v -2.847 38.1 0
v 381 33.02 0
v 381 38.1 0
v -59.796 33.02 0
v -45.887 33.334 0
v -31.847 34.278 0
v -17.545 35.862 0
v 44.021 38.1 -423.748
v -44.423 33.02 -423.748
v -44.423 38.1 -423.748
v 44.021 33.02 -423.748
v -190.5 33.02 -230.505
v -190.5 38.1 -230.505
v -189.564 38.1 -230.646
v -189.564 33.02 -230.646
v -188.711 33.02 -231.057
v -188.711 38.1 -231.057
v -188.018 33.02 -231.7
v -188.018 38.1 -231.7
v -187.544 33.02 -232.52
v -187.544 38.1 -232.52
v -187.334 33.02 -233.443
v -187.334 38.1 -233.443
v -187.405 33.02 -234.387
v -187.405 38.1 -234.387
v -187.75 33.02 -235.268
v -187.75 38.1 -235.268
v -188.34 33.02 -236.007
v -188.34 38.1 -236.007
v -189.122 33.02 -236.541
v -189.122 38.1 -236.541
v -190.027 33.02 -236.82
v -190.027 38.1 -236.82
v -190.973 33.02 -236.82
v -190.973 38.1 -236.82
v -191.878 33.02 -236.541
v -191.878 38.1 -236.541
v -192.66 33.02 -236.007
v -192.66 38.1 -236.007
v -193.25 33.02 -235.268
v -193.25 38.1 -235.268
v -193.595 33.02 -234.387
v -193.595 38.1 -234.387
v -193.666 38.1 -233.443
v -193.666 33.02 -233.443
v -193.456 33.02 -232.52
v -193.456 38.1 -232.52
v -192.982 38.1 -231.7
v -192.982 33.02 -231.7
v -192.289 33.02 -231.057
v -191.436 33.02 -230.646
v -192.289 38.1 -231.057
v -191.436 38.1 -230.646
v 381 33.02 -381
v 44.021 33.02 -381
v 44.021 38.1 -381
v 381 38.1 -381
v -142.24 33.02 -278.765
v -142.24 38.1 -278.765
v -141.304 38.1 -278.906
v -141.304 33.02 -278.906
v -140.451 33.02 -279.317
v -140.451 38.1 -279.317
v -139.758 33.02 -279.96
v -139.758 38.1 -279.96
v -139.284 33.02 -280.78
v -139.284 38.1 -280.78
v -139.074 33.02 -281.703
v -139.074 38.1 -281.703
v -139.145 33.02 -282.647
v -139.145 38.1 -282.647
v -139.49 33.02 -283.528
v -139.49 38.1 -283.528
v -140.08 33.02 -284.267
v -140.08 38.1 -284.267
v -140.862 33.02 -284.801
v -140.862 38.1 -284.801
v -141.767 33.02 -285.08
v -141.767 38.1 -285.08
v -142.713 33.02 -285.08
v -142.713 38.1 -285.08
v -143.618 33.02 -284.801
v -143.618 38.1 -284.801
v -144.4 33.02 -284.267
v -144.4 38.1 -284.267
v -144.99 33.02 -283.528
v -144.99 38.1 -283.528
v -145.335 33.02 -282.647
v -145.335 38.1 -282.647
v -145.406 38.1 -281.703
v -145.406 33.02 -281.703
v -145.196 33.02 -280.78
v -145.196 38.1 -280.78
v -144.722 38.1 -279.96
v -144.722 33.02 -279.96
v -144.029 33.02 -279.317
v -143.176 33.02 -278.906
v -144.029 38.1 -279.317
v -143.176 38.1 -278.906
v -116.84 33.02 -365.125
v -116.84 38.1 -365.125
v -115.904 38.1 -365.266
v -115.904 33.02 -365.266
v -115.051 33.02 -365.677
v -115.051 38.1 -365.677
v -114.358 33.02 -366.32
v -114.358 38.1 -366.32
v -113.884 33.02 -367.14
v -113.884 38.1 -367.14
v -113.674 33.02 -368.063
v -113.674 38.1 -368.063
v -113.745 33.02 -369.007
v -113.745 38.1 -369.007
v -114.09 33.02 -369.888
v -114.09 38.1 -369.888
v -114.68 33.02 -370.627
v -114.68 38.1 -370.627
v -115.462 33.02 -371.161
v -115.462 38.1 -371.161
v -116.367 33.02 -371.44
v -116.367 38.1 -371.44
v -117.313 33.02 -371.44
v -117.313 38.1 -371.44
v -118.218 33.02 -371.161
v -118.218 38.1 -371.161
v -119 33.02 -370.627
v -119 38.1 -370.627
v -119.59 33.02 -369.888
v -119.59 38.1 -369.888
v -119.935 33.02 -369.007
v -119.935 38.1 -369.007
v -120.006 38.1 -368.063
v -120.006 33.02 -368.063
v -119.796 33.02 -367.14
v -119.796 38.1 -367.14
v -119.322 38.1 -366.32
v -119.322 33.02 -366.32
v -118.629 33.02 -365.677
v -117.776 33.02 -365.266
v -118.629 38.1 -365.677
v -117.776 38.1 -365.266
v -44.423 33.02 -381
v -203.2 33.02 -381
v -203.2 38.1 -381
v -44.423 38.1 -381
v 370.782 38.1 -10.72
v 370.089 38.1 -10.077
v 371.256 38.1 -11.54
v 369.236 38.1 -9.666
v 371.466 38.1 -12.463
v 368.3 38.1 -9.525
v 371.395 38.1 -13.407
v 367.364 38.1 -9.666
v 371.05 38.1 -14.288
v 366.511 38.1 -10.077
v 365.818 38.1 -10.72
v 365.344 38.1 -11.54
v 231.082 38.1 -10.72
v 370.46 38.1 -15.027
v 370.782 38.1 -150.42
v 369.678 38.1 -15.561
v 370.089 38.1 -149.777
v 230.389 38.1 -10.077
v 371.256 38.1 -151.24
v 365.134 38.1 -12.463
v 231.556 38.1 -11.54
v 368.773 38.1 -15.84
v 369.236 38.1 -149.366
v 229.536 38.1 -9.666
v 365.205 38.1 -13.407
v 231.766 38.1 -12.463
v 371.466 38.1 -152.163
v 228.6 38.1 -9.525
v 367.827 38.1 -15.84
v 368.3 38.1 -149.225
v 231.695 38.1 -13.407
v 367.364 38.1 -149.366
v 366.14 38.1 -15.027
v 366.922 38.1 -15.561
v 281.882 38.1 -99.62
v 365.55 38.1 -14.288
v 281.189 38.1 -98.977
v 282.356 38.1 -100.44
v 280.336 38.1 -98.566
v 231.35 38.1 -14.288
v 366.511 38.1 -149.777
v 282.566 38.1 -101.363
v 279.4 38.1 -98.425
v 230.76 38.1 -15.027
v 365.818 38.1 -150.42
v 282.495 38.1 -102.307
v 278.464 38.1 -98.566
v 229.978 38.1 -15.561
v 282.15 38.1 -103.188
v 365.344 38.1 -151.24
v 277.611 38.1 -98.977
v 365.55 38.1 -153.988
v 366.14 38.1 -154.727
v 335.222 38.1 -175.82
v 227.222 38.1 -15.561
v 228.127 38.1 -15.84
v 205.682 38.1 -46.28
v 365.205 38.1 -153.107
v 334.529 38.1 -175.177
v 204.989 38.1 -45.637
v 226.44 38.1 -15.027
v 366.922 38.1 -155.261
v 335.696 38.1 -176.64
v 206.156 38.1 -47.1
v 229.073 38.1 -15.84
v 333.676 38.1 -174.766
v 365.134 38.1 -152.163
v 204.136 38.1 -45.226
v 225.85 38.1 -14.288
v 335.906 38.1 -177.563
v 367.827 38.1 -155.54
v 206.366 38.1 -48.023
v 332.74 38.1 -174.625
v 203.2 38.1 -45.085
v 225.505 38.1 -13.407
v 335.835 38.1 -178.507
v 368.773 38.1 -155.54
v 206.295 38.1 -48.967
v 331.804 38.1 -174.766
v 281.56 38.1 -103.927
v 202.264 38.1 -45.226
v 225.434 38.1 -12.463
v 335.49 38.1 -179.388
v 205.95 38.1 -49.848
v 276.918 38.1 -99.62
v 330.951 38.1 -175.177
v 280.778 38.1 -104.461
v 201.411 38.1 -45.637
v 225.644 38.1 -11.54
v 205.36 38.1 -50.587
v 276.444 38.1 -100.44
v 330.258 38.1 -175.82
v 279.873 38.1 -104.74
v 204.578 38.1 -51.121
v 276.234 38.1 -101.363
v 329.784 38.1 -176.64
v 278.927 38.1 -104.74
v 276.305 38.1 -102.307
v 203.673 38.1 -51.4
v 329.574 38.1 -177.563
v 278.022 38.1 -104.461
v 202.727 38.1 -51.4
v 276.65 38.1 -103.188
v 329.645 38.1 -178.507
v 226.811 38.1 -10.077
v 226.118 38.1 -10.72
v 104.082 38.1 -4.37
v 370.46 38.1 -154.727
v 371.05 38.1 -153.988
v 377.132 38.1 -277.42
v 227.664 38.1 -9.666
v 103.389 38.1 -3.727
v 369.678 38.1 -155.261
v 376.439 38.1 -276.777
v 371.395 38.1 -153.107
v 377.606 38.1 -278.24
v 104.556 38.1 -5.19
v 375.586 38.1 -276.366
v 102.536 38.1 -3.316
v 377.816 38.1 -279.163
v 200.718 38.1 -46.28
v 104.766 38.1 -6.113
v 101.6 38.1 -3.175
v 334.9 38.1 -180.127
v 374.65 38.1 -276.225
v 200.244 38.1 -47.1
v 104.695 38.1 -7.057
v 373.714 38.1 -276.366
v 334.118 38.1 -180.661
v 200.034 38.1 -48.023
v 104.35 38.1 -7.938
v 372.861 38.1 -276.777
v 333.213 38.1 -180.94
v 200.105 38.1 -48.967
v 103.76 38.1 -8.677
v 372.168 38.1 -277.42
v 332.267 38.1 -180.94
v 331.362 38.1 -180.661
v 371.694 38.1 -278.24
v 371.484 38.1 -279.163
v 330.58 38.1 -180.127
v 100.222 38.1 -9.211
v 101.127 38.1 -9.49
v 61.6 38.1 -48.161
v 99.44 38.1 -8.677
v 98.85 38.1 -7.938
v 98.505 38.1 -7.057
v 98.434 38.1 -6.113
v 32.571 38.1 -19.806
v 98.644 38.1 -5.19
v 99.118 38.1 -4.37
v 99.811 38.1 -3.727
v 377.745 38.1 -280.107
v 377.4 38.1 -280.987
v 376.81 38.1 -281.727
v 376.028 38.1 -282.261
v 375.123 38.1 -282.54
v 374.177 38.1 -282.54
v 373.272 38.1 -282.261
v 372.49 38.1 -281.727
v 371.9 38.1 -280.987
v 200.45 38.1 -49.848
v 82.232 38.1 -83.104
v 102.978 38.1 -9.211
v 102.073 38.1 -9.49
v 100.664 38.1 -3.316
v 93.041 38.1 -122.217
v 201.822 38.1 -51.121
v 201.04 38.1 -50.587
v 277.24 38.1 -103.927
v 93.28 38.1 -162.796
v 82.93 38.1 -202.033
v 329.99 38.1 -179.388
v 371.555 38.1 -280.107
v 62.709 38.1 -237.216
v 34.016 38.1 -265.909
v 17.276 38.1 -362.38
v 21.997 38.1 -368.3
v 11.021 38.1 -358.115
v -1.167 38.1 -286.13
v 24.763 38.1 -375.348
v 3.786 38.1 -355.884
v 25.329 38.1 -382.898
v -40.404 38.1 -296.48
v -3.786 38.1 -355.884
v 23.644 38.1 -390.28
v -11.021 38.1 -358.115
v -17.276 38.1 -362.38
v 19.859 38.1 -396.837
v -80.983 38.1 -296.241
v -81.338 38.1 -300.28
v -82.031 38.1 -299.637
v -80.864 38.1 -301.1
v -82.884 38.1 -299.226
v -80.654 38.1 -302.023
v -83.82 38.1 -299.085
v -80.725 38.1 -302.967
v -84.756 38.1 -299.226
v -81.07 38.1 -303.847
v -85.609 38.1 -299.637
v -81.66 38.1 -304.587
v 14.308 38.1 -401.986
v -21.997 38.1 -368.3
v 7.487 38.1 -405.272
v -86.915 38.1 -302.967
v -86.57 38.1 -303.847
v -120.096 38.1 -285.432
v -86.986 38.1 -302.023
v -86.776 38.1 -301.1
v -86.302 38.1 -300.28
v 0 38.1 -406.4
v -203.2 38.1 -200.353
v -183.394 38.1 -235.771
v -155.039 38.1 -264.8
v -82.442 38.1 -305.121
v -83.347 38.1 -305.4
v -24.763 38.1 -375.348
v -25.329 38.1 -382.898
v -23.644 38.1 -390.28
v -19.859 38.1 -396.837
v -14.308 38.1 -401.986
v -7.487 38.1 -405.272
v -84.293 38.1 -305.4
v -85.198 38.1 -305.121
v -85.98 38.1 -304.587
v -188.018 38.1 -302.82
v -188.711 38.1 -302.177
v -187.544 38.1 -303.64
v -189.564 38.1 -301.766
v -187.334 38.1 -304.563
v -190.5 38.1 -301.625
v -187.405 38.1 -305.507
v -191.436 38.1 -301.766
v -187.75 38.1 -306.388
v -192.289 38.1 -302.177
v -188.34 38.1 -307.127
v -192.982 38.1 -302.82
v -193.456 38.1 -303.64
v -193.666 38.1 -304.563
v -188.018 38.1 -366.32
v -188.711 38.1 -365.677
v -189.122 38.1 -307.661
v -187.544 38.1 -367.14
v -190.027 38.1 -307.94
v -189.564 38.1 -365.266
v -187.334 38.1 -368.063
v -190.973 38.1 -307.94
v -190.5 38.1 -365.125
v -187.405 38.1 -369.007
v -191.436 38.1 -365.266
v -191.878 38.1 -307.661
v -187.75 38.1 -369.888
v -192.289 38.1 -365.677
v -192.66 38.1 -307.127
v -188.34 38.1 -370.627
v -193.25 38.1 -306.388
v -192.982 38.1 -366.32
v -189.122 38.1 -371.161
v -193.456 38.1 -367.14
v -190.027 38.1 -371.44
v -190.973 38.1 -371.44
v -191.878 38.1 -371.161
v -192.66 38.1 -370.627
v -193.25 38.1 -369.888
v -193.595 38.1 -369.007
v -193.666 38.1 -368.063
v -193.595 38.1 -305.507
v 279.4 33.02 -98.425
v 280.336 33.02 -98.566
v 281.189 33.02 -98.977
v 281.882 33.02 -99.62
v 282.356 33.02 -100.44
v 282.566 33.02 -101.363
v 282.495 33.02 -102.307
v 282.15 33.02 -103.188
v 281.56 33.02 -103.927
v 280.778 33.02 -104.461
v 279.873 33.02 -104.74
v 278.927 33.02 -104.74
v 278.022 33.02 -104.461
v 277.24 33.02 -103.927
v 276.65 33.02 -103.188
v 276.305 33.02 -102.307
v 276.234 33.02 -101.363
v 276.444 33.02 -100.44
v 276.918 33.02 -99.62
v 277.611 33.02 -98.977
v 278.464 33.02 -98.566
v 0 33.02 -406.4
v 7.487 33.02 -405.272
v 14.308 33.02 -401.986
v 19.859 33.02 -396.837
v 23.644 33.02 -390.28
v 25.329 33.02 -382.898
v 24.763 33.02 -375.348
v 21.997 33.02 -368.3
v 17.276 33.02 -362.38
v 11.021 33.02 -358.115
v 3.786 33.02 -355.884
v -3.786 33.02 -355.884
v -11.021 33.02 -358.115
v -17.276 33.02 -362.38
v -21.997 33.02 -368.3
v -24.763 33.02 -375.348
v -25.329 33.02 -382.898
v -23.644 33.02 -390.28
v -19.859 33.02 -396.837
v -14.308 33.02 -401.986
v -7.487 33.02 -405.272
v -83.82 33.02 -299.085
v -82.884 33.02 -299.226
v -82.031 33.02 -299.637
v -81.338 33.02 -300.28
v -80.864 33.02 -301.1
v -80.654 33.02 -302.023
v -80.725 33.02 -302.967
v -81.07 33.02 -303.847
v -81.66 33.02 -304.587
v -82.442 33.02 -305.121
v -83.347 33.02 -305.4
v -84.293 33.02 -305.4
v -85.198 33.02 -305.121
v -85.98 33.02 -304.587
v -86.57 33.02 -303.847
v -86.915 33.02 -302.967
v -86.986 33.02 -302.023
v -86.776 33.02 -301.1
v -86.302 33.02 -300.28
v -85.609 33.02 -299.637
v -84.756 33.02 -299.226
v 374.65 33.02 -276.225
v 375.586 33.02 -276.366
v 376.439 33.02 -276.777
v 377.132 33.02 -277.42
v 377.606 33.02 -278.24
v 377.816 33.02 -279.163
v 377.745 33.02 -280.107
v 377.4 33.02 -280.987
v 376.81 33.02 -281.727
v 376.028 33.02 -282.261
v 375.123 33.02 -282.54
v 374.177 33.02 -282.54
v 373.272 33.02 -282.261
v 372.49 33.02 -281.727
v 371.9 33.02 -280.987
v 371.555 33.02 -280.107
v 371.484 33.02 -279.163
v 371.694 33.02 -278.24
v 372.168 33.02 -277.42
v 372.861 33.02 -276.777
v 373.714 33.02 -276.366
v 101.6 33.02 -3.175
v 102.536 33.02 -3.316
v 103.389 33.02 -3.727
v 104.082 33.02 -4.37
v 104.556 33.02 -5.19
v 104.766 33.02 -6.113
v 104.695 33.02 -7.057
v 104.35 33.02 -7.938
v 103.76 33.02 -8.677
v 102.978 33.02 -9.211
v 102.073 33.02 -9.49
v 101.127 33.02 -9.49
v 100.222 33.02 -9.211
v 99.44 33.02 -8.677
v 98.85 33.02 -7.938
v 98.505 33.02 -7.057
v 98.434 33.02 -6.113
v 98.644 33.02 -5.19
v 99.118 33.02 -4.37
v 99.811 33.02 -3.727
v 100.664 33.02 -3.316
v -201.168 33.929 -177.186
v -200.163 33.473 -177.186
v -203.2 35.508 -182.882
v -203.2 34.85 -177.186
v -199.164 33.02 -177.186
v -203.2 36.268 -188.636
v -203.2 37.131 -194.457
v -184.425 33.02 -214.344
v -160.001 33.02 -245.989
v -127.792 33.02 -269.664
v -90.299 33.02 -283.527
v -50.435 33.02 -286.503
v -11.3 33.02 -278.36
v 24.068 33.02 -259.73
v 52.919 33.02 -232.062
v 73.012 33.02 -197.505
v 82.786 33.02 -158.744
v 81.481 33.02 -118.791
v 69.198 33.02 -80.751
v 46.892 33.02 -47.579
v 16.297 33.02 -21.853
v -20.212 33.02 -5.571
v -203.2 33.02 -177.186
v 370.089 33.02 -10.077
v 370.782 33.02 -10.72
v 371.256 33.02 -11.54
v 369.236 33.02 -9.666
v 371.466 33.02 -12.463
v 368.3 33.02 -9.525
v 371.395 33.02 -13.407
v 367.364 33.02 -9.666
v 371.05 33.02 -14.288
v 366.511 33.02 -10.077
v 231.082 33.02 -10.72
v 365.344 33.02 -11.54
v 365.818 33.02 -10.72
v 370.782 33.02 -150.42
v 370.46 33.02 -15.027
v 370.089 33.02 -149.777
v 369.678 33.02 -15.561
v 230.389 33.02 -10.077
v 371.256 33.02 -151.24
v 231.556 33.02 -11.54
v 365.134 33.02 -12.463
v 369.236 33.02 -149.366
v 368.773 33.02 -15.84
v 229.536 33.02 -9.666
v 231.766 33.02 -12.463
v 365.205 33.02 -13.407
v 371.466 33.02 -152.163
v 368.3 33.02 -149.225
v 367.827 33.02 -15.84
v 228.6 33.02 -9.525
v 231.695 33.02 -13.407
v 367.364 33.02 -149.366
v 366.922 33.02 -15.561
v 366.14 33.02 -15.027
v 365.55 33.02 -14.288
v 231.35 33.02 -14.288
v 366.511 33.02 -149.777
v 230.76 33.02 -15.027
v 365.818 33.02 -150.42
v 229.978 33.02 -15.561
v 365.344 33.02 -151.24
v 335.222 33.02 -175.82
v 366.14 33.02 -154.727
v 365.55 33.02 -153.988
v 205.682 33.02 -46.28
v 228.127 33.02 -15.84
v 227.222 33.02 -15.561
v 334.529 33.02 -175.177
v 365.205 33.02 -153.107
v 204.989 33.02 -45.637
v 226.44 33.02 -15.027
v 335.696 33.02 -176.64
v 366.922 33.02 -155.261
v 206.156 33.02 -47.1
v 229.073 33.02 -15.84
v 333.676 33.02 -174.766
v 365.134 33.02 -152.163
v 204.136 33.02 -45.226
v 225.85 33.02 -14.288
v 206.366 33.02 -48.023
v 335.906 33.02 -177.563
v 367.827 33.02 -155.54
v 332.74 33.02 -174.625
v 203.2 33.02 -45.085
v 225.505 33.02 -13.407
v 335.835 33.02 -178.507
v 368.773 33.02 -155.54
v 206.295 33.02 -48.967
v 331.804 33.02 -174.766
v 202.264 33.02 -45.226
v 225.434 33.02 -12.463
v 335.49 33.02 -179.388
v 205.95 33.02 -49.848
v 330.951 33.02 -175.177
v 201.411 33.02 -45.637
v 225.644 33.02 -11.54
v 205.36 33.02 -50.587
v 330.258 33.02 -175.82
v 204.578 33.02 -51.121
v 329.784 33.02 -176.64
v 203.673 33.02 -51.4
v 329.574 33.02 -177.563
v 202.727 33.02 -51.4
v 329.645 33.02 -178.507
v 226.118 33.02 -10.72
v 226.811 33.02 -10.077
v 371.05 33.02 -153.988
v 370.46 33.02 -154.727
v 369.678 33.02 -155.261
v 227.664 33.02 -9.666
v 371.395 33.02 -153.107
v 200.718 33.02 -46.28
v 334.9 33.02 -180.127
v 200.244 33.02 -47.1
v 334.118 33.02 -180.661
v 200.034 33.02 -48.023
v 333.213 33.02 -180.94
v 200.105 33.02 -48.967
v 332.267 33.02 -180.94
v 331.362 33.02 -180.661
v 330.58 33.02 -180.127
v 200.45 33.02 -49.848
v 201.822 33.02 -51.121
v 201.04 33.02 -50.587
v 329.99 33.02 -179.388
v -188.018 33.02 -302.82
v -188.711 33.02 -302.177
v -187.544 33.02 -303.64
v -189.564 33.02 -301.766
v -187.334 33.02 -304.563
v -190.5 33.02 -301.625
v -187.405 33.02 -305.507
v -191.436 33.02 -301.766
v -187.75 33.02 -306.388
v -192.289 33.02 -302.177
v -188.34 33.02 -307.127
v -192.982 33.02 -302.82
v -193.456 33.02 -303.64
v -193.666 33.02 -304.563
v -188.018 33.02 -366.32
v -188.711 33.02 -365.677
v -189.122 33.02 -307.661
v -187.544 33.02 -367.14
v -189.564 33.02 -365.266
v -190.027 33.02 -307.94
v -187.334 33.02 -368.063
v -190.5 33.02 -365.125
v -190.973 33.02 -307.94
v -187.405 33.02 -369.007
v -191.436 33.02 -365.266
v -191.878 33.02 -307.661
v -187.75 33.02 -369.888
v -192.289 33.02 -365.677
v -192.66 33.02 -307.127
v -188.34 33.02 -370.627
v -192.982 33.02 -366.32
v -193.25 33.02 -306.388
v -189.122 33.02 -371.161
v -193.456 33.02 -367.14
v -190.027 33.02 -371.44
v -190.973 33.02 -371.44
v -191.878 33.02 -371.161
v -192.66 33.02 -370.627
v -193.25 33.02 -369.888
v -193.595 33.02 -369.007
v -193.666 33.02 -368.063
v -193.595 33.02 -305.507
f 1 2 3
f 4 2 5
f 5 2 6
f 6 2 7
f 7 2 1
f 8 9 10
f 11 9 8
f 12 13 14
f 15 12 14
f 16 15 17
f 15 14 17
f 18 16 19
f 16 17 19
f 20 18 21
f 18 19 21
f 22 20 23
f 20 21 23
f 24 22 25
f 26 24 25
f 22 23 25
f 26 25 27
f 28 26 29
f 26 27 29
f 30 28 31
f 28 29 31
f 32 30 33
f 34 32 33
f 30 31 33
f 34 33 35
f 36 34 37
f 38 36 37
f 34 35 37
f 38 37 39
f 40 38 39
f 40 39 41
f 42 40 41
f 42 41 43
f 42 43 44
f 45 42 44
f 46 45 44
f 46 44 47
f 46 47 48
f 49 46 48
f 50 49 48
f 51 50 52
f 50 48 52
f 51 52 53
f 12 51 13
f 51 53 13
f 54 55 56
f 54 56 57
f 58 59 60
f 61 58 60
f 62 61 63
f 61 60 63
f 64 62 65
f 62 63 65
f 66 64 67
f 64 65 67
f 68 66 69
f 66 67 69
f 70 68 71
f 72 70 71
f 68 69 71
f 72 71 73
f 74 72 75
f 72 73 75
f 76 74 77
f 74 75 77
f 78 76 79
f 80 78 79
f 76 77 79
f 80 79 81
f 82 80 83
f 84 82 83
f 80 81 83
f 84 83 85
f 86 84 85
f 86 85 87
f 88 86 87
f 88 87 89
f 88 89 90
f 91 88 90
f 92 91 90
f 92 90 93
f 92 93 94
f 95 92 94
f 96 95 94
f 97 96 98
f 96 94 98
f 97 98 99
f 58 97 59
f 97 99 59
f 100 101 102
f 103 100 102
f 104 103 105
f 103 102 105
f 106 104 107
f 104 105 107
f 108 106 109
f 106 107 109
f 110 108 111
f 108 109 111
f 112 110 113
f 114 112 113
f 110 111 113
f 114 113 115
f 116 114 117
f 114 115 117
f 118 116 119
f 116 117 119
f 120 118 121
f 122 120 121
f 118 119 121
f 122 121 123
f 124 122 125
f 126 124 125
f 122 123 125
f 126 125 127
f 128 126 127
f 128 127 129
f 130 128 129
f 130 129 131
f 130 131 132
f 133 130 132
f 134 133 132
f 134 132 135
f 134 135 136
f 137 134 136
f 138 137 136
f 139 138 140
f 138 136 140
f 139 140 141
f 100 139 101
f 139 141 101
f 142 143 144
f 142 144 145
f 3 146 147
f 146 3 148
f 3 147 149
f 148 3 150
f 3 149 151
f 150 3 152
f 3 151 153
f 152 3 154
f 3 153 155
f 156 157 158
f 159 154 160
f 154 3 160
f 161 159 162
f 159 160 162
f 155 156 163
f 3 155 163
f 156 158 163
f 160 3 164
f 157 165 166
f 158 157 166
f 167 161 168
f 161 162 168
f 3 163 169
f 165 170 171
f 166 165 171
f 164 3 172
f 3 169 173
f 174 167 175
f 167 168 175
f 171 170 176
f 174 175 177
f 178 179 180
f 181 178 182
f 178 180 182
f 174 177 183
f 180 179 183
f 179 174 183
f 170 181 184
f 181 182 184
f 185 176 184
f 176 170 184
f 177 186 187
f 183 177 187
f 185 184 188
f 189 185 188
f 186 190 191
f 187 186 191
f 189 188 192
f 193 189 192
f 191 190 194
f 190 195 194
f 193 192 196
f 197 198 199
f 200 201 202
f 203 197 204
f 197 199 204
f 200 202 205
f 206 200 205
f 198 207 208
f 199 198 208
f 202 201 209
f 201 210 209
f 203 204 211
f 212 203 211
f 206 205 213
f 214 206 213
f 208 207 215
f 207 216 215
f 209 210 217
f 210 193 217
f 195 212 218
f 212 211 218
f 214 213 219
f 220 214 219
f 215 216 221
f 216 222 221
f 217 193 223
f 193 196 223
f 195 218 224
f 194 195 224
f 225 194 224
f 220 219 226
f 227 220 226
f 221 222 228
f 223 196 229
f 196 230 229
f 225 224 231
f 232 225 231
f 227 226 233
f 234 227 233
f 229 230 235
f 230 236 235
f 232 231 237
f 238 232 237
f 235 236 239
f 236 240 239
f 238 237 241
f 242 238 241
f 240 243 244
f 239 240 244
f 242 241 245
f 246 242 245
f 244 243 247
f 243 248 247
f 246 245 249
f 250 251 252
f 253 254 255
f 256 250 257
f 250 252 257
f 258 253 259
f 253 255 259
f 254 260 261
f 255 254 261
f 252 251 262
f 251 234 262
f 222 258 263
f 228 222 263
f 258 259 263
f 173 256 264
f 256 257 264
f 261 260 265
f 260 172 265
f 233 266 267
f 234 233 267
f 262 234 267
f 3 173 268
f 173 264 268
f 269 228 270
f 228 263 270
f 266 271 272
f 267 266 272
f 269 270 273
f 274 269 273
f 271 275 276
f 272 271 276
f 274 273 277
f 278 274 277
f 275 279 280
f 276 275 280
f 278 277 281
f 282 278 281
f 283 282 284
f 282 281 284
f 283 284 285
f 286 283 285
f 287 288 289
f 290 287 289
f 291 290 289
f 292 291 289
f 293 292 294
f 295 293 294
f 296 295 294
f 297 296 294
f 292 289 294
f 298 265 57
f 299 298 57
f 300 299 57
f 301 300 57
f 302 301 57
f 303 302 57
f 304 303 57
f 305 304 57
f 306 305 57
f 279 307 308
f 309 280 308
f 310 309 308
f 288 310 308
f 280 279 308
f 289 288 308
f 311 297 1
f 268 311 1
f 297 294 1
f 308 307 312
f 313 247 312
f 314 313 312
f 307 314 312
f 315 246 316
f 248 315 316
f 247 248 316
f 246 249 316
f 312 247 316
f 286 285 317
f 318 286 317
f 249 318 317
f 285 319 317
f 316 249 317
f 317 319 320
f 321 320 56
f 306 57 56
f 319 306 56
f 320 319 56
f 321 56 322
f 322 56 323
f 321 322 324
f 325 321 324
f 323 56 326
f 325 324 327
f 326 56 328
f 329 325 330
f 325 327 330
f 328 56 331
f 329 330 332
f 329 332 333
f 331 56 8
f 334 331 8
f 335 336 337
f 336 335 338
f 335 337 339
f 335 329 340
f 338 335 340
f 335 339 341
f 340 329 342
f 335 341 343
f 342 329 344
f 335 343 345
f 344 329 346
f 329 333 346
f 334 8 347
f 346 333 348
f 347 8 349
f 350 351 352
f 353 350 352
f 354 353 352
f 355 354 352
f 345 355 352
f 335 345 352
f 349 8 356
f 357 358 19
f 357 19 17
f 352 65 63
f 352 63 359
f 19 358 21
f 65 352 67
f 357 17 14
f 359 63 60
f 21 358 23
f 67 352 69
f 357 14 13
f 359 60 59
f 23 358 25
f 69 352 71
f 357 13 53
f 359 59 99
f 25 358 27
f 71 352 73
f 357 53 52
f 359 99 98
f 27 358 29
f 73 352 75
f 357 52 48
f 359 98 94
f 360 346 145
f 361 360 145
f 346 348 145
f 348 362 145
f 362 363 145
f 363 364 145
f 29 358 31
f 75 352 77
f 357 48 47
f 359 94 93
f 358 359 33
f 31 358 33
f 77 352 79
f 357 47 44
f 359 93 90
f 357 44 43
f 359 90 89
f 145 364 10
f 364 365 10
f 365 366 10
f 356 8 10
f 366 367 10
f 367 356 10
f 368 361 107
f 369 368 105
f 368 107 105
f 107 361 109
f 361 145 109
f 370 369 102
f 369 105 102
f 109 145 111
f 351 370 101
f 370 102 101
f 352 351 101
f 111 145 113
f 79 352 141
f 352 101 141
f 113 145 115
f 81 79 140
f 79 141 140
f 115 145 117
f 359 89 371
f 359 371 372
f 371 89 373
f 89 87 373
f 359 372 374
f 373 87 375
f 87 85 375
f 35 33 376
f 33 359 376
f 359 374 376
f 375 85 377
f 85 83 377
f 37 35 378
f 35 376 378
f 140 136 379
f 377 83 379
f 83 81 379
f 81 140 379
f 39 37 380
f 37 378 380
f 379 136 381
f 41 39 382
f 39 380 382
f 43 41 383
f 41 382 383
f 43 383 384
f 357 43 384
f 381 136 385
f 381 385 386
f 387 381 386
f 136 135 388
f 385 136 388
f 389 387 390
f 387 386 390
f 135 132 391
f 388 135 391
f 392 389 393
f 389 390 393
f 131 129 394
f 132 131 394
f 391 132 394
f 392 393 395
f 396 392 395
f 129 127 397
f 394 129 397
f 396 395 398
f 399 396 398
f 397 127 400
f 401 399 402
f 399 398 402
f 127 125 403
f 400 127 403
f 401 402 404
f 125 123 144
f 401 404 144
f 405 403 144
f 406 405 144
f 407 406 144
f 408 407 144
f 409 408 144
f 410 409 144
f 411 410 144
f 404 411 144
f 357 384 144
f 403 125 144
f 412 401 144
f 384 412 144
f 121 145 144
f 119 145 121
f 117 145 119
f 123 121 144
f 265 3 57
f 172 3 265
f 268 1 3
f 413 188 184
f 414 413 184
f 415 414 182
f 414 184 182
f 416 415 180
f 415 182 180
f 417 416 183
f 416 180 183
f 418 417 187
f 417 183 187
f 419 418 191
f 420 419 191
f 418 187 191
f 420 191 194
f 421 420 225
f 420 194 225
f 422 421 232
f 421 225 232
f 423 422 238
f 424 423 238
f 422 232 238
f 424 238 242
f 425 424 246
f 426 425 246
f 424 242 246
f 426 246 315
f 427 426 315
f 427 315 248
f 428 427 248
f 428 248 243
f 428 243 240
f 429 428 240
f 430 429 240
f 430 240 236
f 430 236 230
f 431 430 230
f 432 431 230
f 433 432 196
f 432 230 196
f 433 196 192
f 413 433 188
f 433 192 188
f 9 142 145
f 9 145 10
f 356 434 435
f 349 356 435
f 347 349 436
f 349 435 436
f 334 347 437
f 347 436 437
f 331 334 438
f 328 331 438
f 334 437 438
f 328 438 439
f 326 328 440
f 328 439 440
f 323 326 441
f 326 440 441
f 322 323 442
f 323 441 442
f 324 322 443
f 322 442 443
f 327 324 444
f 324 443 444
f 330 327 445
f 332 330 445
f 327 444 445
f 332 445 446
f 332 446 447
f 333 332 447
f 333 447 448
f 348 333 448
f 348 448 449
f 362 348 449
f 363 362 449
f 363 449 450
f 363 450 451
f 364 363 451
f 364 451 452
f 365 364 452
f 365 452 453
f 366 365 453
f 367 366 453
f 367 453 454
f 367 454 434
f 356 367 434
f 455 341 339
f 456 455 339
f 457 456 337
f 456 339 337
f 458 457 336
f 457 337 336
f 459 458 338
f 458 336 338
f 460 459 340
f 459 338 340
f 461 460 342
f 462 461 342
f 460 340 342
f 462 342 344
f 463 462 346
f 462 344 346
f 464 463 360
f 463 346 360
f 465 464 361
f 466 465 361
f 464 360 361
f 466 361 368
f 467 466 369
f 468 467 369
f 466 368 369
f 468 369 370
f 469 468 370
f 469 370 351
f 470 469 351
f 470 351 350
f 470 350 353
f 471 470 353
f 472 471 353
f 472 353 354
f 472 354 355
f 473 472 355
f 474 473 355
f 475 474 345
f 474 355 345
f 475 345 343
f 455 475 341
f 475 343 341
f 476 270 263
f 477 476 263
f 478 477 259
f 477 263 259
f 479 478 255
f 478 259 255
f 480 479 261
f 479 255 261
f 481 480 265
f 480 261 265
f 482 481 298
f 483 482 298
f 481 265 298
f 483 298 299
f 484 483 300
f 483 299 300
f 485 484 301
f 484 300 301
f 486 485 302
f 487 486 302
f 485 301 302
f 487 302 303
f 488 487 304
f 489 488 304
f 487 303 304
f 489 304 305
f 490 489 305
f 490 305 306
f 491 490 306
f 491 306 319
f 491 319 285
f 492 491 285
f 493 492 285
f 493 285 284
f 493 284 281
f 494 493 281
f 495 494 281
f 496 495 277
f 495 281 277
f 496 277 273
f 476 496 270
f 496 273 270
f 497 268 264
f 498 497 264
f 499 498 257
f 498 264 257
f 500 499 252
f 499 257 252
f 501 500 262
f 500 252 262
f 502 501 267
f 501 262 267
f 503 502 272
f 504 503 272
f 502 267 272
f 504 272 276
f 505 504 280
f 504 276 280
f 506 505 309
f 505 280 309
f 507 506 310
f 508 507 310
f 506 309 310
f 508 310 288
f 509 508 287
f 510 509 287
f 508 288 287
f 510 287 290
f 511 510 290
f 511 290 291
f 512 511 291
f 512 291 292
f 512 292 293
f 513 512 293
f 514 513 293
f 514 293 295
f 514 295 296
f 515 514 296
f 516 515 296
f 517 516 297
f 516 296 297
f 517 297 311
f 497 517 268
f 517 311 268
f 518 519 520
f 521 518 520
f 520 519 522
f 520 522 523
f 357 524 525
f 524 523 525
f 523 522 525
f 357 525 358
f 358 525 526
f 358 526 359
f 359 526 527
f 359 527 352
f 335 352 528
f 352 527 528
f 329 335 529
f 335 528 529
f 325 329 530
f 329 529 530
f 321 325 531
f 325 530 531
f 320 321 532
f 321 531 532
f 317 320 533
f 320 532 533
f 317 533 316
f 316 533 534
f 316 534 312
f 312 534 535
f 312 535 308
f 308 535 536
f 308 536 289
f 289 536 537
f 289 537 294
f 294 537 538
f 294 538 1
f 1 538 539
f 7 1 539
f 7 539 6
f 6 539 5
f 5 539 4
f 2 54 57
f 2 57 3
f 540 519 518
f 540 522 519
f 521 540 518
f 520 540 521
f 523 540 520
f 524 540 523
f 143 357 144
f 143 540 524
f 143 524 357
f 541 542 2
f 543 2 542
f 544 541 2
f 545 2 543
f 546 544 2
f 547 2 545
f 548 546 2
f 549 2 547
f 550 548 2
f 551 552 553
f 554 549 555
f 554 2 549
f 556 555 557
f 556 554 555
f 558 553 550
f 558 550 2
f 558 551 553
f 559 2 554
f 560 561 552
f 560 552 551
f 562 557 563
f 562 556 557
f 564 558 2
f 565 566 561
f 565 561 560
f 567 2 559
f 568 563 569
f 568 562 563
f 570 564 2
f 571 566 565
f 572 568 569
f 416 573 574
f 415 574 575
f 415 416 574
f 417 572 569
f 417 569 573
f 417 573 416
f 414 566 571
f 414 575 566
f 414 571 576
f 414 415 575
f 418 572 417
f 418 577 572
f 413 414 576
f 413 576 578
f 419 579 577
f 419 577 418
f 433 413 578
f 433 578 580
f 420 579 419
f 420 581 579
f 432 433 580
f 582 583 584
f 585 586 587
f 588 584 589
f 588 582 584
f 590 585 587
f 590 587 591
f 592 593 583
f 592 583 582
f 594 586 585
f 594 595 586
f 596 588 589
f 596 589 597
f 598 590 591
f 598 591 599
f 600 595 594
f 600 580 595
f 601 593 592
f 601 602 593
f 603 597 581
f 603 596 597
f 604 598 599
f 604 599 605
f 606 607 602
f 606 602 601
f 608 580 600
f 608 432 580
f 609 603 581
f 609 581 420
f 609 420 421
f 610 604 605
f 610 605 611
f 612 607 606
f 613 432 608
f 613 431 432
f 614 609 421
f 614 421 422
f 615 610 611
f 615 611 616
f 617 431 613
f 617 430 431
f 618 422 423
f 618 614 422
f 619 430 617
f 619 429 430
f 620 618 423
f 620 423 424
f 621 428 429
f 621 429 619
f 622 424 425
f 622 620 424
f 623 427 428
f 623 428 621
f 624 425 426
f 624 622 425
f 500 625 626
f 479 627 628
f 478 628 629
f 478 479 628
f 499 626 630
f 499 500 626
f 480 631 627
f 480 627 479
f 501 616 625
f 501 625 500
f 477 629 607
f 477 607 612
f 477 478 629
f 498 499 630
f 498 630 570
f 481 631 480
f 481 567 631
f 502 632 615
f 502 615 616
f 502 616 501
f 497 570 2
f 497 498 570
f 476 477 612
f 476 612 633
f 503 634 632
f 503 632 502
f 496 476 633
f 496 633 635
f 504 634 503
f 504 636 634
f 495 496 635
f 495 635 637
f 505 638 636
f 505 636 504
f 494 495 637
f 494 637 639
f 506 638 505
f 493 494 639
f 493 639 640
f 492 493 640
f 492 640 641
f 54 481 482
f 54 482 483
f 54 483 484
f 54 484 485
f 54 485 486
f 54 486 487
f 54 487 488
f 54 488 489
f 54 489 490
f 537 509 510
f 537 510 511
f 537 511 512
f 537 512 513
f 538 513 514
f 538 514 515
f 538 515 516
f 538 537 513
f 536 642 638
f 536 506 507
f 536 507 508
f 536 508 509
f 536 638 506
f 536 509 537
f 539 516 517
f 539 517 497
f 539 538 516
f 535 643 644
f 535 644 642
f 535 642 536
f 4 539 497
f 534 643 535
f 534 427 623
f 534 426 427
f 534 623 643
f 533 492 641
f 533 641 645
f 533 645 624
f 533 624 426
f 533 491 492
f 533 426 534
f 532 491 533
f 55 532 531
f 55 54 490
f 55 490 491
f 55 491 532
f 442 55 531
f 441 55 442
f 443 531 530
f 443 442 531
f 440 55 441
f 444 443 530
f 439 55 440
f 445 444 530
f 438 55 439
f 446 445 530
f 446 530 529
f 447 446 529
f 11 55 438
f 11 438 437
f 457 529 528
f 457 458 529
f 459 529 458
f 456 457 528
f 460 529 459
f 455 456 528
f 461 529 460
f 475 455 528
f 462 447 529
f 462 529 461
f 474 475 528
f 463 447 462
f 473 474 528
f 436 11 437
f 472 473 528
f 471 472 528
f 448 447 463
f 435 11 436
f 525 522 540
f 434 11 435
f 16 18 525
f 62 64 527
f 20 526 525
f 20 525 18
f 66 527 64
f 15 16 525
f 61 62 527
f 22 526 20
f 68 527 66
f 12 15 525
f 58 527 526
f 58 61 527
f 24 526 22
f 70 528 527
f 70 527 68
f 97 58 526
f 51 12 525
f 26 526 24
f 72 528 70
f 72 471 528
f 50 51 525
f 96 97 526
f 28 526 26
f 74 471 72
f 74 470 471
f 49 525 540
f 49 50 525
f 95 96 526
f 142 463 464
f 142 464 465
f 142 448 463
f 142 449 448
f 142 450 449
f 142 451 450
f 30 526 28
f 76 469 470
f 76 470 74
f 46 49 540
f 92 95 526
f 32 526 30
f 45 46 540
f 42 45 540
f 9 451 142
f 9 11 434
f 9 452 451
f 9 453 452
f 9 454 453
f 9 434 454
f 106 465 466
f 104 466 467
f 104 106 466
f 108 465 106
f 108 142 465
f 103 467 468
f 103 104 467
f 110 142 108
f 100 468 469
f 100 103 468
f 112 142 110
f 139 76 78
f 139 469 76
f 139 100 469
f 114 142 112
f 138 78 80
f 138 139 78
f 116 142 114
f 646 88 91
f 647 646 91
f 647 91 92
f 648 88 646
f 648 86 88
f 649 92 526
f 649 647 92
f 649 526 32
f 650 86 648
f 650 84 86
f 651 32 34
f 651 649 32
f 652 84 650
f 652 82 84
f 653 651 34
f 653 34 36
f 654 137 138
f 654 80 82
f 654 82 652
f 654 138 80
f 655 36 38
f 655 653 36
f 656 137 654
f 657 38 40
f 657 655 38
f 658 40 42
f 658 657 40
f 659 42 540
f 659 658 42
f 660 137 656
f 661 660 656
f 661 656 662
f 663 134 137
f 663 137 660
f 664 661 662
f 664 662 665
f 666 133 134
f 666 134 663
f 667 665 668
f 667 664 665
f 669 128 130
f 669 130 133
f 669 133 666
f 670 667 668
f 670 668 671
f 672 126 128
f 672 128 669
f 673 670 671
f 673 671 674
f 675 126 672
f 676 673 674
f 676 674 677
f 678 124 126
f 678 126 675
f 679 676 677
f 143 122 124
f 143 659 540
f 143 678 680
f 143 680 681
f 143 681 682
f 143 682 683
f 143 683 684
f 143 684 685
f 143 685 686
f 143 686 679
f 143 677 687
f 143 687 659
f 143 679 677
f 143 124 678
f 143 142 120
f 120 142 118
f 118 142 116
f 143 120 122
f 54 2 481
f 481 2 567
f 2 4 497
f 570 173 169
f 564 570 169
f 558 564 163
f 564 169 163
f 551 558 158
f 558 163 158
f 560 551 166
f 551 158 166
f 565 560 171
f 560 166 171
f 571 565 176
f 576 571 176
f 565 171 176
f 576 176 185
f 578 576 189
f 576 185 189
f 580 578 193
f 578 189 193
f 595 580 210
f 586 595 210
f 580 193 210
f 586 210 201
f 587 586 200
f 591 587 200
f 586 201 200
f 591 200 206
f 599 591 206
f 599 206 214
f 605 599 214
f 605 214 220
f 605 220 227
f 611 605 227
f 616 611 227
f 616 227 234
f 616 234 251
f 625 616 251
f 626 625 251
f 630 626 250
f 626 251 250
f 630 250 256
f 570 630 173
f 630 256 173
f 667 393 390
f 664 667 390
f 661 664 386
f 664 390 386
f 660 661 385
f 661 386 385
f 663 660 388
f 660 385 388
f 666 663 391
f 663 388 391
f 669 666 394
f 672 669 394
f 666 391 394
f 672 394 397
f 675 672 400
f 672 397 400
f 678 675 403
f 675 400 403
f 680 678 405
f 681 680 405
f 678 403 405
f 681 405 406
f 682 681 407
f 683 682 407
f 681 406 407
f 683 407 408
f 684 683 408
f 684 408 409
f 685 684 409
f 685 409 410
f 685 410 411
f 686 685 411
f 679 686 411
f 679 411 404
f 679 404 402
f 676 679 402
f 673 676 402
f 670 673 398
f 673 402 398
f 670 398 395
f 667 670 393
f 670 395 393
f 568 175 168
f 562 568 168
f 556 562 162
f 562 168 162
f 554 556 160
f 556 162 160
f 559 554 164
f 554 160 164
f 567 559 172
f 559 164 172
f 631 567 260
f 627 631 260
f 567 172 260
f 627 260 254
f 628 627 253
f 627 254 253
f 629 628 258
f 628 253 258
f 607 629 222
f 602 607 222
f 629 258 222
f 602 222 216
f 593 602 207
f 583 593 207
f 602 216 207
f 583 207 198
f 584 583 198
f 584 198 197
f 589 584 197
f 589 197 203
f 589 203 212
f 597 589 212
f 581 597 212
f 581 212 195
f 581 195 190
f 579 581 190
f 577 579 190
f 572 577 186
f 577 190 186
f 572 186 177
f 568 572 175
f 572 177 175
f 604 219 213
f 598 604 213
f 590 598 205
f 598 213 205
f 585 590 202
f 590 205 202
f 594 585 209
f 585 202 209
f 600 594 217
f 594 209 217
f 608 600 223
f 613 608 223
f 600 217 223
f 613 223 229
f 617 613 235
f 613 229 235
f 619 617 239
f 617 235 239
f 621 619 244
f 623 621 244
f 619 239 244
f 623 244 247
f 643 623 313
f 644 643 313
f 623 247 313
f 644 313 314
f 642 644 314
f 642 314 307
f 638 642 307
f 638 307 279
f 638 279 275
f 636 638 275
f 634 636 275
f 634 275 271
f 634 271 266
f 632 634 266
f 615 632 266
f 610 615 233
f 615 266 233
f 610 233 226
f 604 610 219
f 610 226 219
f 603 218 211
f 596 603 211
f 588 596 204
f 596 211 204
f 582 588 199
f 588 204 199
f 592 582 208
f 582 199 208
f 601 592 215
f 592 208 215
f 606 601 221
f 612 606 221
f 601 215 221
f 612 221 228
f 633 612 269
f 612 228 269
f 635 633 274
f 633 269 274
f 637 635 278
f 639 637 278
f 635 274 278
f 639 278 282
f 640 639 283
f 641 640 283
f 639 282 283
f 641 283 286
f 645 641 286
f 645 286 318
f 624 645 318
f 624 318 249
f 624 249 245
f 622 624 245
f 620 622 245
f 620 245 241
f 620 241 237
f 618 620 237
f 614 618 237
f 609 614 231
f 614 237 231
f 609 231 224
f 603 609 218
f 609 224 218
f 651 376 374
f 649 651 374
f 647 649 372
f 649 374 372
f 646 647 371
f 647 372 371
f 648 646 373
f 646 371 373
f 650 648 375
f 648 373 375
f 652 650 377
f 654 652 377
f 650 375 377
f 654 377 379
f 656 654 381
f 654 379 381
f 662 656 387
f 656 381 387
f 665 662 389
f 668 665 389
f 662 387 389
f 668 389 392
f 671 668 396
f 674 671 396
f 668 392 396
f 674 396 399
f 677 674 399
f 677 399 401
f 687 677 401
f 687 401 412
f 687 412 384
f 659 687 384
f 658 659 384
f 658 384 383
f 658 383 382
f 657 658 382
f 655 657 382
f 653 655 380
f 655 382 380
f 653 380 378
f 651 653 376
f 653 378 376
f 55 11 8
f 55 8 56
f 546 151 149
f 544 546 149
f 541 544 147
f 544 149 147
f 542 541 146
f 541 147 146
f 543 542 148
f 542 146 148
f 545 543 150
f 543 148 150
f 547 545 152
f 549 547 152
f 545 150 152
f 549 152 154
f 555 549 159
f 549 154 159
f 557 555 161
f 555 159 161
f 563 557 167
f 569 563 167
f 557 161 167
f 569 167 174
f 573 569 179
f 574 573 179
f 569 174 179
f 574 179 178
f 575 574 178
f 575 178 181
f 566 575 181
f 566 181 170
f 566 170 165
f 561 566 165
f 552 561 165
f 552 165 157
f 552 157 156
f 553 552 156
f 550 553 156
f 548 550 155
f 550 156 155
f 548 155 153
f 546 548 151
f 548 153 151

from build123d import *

# Parameters (mm, degrees)
BOSS_EXTRUDE1_START = 33.02
BOSS_EXTRUDE1_DEPTH = 5.08
SKETCH4_R           = 25.4
CUT_EXTRUDE1_DEPTH  = 50.8
CUT_EXTRUDE5_START  = 5.08
SKETCH1_R           = 143.404424797
CUT_EXTRUDE5_DEPTH  = 38.1
CHAMFER1_SIZE2      = 5.08
CHAMFER1_SIZE       = 10.894095156
SKETCH6_W           = 33.782
SKETCH6_H           = 14.432407555
CUT_EXTRUDE7_DEPTH  = 25.4
SKETCH7_R           = 3.175
CUT_EXTRUDE8_DEPTH  = 5.08
SKETCH8_R           = 3.175
CUT_EXTRUDE9_DEPTH  = 5.08


with BuildPart() as part:
    # Sketch2 → Boss-Extrude1 (new body)
    with BuildSketch(Plane(origin=(0, 0, 0), x_dir=(1, 0, 0), z_dir=(0, 1, 0)).offset(BOSS_EXTRUDE1_START)):
        Polygon((-203.2, 381), (-44.423028516, 381), (-44.423028516, 423.747508854), (44.020558762, 423.747508854), (44.020558762, 381), (381, 381), (381, 0), (-203.2, 0), align=None)
    extrude(amount=BOSS_EXTRUDE1_DEPTH)

    # Sketch4 → Cut-Extrude1 (cut)
    with BuildSketch(Plane.XZ.offset(-33.02)):
        with Locations(Location((0, -381, 0), (0, 0, 270))):
            Circle(SKETCH4_R)
    extrude(amount=-CUT_EXTRUDE1_DEPTH, mode=Mode.SUBTRACT)

    # Sketch1 → Cut-Extrude5 (cut)
    with BuildSketch(Plane(origin=(0, 0, 0), x_dir=(1, 0, 0), z_dir=(0, 1, 0)).offset(CUT_EXTRUDE5_START)):
        with Locations((-59.795575203, 143.404424797)):
            Circle(SKETCH1_R)
    extrude(amount=CUT_EXTRUDE5_DEPTH, mode=Mode.SUBTRACT)


with BuildPart() as cut_extrude5_kept_piece:
    # of the separate pieces the step leaves, the one the design keeps (cut_extrude5_pieces_kept)
    add(part.part.solids().sort_by_distance((-203.2, 33.02, -381))[0])

    # Chamfer1
    chamfer1_edges = [cut_extrude5_kept_piece.edges().sort_by_distance(p)[0] for p in [
        (41.606666023, 38.1, -244.806666023),
    ]]
    chamfer1_side = [cut_extrude5_kept_piece.faces().sort_by_distance(p)[0] for p in [
        (41.678508072, 38.1, -244.878508072),
    ]]
    chamfer(chamfer1_edges, length=CHAMFER1_SIZE - 0.0001, length2=CHAMFER1_SIZE2 - 0.0001, reference=chamfer1_side[0])  # a hair under: the kernel refuses the full size

    # Sketch6 → Cut-Extrude7 (cut)
    with BuildSketch(Plane.ZY.offset(203.2)):
        with Locations((-160.295424797, 40.236203778)):
            Rectangle(SKETCH6_W, SKETCH6_H)
    extrude(amount=-CUT_EXTRUDE7_DEPTH, mode=Mode.SUBTRACT)

    # Sketch7 → Cut-Extrude8 (cut)
    with BuildSketch(Plane(origin=(0, 38.1, 0), x_dir=(1, 0, 0), z_dir=(0, 1, 0))):
        with Locations(Location((368.3, 152.4, 0), (0, 0, 270))):
            Circle(SKETCH7_R)
        with Locations(Location((374.65, 279.4, 0), (0, 0, 270))):
            Circle(SKETCH7_R)
        with Locations(Location((332.74, 177.8, 0), (0, 0, 270))):
            Circle(SKETCH7_R)
        with Locations(Location((279.4, 101.6, 0), (0, 0, 270))):
            Circle(SKETCH7_R)
        with Locations(Location((101.6, 6.35, 0), (0, 0, 270))):
            Circle(SKETCH7_R)
        with Locations(Location((203.2, 48.26, 0), (0, 0, 270))):
            Circle(SKETCH7_R)
        with Locations(Location((228.6, 12.7, 0), (0, 0, 270))):
            Circle(SKETCH7_R)
        with Locations(Location((368.3, 12.7, 0), (0, 0, 270))):
            Circle(SKETCH7_R)
    extrude(amount=-CUT_EXTRUDE8_DEPTH, mode=Mode.SUBTRACT)

    # Sketch8 → Cut-Extrude9 (cut)
    with BuildSketch(Plane(origin=(0, 38.1, 0), x_dir=(1, 0, 0), z_dir=(0, 1, 0))):
        with Locations(Location((-190.5, 368.3, 0), (0, 0, 270))):
            Circle(SKETCH8_R)
        with Locations(Location((-116.84, 368.3, 0), (0, 0, 270))):
            Circle(SKETCH8_R)
        with Locations(Location((-83.82, 302.26, 0), (0, 0, 270))):
            Circle(SKETCH8_R)
        with Locations(Location((-142.24, 281.94, 0), (0, 0, 270))):
            Circle(SKETCH8_R)
        with Locations(Location((-190.5, 304.8, 0), (0, 0, 270))):
            Circle(SKETCH8_R)
        with Locations(Location((-190.5, 233.68, 0), (0, 0, 270))):
            Circle(SKETCH8_R)
    extrude(amount=-CUT_EXTRUDE9_DEPTH, mode=Mode.SUBTRACT)


solid = cut_extrude5_kept_piece.part
